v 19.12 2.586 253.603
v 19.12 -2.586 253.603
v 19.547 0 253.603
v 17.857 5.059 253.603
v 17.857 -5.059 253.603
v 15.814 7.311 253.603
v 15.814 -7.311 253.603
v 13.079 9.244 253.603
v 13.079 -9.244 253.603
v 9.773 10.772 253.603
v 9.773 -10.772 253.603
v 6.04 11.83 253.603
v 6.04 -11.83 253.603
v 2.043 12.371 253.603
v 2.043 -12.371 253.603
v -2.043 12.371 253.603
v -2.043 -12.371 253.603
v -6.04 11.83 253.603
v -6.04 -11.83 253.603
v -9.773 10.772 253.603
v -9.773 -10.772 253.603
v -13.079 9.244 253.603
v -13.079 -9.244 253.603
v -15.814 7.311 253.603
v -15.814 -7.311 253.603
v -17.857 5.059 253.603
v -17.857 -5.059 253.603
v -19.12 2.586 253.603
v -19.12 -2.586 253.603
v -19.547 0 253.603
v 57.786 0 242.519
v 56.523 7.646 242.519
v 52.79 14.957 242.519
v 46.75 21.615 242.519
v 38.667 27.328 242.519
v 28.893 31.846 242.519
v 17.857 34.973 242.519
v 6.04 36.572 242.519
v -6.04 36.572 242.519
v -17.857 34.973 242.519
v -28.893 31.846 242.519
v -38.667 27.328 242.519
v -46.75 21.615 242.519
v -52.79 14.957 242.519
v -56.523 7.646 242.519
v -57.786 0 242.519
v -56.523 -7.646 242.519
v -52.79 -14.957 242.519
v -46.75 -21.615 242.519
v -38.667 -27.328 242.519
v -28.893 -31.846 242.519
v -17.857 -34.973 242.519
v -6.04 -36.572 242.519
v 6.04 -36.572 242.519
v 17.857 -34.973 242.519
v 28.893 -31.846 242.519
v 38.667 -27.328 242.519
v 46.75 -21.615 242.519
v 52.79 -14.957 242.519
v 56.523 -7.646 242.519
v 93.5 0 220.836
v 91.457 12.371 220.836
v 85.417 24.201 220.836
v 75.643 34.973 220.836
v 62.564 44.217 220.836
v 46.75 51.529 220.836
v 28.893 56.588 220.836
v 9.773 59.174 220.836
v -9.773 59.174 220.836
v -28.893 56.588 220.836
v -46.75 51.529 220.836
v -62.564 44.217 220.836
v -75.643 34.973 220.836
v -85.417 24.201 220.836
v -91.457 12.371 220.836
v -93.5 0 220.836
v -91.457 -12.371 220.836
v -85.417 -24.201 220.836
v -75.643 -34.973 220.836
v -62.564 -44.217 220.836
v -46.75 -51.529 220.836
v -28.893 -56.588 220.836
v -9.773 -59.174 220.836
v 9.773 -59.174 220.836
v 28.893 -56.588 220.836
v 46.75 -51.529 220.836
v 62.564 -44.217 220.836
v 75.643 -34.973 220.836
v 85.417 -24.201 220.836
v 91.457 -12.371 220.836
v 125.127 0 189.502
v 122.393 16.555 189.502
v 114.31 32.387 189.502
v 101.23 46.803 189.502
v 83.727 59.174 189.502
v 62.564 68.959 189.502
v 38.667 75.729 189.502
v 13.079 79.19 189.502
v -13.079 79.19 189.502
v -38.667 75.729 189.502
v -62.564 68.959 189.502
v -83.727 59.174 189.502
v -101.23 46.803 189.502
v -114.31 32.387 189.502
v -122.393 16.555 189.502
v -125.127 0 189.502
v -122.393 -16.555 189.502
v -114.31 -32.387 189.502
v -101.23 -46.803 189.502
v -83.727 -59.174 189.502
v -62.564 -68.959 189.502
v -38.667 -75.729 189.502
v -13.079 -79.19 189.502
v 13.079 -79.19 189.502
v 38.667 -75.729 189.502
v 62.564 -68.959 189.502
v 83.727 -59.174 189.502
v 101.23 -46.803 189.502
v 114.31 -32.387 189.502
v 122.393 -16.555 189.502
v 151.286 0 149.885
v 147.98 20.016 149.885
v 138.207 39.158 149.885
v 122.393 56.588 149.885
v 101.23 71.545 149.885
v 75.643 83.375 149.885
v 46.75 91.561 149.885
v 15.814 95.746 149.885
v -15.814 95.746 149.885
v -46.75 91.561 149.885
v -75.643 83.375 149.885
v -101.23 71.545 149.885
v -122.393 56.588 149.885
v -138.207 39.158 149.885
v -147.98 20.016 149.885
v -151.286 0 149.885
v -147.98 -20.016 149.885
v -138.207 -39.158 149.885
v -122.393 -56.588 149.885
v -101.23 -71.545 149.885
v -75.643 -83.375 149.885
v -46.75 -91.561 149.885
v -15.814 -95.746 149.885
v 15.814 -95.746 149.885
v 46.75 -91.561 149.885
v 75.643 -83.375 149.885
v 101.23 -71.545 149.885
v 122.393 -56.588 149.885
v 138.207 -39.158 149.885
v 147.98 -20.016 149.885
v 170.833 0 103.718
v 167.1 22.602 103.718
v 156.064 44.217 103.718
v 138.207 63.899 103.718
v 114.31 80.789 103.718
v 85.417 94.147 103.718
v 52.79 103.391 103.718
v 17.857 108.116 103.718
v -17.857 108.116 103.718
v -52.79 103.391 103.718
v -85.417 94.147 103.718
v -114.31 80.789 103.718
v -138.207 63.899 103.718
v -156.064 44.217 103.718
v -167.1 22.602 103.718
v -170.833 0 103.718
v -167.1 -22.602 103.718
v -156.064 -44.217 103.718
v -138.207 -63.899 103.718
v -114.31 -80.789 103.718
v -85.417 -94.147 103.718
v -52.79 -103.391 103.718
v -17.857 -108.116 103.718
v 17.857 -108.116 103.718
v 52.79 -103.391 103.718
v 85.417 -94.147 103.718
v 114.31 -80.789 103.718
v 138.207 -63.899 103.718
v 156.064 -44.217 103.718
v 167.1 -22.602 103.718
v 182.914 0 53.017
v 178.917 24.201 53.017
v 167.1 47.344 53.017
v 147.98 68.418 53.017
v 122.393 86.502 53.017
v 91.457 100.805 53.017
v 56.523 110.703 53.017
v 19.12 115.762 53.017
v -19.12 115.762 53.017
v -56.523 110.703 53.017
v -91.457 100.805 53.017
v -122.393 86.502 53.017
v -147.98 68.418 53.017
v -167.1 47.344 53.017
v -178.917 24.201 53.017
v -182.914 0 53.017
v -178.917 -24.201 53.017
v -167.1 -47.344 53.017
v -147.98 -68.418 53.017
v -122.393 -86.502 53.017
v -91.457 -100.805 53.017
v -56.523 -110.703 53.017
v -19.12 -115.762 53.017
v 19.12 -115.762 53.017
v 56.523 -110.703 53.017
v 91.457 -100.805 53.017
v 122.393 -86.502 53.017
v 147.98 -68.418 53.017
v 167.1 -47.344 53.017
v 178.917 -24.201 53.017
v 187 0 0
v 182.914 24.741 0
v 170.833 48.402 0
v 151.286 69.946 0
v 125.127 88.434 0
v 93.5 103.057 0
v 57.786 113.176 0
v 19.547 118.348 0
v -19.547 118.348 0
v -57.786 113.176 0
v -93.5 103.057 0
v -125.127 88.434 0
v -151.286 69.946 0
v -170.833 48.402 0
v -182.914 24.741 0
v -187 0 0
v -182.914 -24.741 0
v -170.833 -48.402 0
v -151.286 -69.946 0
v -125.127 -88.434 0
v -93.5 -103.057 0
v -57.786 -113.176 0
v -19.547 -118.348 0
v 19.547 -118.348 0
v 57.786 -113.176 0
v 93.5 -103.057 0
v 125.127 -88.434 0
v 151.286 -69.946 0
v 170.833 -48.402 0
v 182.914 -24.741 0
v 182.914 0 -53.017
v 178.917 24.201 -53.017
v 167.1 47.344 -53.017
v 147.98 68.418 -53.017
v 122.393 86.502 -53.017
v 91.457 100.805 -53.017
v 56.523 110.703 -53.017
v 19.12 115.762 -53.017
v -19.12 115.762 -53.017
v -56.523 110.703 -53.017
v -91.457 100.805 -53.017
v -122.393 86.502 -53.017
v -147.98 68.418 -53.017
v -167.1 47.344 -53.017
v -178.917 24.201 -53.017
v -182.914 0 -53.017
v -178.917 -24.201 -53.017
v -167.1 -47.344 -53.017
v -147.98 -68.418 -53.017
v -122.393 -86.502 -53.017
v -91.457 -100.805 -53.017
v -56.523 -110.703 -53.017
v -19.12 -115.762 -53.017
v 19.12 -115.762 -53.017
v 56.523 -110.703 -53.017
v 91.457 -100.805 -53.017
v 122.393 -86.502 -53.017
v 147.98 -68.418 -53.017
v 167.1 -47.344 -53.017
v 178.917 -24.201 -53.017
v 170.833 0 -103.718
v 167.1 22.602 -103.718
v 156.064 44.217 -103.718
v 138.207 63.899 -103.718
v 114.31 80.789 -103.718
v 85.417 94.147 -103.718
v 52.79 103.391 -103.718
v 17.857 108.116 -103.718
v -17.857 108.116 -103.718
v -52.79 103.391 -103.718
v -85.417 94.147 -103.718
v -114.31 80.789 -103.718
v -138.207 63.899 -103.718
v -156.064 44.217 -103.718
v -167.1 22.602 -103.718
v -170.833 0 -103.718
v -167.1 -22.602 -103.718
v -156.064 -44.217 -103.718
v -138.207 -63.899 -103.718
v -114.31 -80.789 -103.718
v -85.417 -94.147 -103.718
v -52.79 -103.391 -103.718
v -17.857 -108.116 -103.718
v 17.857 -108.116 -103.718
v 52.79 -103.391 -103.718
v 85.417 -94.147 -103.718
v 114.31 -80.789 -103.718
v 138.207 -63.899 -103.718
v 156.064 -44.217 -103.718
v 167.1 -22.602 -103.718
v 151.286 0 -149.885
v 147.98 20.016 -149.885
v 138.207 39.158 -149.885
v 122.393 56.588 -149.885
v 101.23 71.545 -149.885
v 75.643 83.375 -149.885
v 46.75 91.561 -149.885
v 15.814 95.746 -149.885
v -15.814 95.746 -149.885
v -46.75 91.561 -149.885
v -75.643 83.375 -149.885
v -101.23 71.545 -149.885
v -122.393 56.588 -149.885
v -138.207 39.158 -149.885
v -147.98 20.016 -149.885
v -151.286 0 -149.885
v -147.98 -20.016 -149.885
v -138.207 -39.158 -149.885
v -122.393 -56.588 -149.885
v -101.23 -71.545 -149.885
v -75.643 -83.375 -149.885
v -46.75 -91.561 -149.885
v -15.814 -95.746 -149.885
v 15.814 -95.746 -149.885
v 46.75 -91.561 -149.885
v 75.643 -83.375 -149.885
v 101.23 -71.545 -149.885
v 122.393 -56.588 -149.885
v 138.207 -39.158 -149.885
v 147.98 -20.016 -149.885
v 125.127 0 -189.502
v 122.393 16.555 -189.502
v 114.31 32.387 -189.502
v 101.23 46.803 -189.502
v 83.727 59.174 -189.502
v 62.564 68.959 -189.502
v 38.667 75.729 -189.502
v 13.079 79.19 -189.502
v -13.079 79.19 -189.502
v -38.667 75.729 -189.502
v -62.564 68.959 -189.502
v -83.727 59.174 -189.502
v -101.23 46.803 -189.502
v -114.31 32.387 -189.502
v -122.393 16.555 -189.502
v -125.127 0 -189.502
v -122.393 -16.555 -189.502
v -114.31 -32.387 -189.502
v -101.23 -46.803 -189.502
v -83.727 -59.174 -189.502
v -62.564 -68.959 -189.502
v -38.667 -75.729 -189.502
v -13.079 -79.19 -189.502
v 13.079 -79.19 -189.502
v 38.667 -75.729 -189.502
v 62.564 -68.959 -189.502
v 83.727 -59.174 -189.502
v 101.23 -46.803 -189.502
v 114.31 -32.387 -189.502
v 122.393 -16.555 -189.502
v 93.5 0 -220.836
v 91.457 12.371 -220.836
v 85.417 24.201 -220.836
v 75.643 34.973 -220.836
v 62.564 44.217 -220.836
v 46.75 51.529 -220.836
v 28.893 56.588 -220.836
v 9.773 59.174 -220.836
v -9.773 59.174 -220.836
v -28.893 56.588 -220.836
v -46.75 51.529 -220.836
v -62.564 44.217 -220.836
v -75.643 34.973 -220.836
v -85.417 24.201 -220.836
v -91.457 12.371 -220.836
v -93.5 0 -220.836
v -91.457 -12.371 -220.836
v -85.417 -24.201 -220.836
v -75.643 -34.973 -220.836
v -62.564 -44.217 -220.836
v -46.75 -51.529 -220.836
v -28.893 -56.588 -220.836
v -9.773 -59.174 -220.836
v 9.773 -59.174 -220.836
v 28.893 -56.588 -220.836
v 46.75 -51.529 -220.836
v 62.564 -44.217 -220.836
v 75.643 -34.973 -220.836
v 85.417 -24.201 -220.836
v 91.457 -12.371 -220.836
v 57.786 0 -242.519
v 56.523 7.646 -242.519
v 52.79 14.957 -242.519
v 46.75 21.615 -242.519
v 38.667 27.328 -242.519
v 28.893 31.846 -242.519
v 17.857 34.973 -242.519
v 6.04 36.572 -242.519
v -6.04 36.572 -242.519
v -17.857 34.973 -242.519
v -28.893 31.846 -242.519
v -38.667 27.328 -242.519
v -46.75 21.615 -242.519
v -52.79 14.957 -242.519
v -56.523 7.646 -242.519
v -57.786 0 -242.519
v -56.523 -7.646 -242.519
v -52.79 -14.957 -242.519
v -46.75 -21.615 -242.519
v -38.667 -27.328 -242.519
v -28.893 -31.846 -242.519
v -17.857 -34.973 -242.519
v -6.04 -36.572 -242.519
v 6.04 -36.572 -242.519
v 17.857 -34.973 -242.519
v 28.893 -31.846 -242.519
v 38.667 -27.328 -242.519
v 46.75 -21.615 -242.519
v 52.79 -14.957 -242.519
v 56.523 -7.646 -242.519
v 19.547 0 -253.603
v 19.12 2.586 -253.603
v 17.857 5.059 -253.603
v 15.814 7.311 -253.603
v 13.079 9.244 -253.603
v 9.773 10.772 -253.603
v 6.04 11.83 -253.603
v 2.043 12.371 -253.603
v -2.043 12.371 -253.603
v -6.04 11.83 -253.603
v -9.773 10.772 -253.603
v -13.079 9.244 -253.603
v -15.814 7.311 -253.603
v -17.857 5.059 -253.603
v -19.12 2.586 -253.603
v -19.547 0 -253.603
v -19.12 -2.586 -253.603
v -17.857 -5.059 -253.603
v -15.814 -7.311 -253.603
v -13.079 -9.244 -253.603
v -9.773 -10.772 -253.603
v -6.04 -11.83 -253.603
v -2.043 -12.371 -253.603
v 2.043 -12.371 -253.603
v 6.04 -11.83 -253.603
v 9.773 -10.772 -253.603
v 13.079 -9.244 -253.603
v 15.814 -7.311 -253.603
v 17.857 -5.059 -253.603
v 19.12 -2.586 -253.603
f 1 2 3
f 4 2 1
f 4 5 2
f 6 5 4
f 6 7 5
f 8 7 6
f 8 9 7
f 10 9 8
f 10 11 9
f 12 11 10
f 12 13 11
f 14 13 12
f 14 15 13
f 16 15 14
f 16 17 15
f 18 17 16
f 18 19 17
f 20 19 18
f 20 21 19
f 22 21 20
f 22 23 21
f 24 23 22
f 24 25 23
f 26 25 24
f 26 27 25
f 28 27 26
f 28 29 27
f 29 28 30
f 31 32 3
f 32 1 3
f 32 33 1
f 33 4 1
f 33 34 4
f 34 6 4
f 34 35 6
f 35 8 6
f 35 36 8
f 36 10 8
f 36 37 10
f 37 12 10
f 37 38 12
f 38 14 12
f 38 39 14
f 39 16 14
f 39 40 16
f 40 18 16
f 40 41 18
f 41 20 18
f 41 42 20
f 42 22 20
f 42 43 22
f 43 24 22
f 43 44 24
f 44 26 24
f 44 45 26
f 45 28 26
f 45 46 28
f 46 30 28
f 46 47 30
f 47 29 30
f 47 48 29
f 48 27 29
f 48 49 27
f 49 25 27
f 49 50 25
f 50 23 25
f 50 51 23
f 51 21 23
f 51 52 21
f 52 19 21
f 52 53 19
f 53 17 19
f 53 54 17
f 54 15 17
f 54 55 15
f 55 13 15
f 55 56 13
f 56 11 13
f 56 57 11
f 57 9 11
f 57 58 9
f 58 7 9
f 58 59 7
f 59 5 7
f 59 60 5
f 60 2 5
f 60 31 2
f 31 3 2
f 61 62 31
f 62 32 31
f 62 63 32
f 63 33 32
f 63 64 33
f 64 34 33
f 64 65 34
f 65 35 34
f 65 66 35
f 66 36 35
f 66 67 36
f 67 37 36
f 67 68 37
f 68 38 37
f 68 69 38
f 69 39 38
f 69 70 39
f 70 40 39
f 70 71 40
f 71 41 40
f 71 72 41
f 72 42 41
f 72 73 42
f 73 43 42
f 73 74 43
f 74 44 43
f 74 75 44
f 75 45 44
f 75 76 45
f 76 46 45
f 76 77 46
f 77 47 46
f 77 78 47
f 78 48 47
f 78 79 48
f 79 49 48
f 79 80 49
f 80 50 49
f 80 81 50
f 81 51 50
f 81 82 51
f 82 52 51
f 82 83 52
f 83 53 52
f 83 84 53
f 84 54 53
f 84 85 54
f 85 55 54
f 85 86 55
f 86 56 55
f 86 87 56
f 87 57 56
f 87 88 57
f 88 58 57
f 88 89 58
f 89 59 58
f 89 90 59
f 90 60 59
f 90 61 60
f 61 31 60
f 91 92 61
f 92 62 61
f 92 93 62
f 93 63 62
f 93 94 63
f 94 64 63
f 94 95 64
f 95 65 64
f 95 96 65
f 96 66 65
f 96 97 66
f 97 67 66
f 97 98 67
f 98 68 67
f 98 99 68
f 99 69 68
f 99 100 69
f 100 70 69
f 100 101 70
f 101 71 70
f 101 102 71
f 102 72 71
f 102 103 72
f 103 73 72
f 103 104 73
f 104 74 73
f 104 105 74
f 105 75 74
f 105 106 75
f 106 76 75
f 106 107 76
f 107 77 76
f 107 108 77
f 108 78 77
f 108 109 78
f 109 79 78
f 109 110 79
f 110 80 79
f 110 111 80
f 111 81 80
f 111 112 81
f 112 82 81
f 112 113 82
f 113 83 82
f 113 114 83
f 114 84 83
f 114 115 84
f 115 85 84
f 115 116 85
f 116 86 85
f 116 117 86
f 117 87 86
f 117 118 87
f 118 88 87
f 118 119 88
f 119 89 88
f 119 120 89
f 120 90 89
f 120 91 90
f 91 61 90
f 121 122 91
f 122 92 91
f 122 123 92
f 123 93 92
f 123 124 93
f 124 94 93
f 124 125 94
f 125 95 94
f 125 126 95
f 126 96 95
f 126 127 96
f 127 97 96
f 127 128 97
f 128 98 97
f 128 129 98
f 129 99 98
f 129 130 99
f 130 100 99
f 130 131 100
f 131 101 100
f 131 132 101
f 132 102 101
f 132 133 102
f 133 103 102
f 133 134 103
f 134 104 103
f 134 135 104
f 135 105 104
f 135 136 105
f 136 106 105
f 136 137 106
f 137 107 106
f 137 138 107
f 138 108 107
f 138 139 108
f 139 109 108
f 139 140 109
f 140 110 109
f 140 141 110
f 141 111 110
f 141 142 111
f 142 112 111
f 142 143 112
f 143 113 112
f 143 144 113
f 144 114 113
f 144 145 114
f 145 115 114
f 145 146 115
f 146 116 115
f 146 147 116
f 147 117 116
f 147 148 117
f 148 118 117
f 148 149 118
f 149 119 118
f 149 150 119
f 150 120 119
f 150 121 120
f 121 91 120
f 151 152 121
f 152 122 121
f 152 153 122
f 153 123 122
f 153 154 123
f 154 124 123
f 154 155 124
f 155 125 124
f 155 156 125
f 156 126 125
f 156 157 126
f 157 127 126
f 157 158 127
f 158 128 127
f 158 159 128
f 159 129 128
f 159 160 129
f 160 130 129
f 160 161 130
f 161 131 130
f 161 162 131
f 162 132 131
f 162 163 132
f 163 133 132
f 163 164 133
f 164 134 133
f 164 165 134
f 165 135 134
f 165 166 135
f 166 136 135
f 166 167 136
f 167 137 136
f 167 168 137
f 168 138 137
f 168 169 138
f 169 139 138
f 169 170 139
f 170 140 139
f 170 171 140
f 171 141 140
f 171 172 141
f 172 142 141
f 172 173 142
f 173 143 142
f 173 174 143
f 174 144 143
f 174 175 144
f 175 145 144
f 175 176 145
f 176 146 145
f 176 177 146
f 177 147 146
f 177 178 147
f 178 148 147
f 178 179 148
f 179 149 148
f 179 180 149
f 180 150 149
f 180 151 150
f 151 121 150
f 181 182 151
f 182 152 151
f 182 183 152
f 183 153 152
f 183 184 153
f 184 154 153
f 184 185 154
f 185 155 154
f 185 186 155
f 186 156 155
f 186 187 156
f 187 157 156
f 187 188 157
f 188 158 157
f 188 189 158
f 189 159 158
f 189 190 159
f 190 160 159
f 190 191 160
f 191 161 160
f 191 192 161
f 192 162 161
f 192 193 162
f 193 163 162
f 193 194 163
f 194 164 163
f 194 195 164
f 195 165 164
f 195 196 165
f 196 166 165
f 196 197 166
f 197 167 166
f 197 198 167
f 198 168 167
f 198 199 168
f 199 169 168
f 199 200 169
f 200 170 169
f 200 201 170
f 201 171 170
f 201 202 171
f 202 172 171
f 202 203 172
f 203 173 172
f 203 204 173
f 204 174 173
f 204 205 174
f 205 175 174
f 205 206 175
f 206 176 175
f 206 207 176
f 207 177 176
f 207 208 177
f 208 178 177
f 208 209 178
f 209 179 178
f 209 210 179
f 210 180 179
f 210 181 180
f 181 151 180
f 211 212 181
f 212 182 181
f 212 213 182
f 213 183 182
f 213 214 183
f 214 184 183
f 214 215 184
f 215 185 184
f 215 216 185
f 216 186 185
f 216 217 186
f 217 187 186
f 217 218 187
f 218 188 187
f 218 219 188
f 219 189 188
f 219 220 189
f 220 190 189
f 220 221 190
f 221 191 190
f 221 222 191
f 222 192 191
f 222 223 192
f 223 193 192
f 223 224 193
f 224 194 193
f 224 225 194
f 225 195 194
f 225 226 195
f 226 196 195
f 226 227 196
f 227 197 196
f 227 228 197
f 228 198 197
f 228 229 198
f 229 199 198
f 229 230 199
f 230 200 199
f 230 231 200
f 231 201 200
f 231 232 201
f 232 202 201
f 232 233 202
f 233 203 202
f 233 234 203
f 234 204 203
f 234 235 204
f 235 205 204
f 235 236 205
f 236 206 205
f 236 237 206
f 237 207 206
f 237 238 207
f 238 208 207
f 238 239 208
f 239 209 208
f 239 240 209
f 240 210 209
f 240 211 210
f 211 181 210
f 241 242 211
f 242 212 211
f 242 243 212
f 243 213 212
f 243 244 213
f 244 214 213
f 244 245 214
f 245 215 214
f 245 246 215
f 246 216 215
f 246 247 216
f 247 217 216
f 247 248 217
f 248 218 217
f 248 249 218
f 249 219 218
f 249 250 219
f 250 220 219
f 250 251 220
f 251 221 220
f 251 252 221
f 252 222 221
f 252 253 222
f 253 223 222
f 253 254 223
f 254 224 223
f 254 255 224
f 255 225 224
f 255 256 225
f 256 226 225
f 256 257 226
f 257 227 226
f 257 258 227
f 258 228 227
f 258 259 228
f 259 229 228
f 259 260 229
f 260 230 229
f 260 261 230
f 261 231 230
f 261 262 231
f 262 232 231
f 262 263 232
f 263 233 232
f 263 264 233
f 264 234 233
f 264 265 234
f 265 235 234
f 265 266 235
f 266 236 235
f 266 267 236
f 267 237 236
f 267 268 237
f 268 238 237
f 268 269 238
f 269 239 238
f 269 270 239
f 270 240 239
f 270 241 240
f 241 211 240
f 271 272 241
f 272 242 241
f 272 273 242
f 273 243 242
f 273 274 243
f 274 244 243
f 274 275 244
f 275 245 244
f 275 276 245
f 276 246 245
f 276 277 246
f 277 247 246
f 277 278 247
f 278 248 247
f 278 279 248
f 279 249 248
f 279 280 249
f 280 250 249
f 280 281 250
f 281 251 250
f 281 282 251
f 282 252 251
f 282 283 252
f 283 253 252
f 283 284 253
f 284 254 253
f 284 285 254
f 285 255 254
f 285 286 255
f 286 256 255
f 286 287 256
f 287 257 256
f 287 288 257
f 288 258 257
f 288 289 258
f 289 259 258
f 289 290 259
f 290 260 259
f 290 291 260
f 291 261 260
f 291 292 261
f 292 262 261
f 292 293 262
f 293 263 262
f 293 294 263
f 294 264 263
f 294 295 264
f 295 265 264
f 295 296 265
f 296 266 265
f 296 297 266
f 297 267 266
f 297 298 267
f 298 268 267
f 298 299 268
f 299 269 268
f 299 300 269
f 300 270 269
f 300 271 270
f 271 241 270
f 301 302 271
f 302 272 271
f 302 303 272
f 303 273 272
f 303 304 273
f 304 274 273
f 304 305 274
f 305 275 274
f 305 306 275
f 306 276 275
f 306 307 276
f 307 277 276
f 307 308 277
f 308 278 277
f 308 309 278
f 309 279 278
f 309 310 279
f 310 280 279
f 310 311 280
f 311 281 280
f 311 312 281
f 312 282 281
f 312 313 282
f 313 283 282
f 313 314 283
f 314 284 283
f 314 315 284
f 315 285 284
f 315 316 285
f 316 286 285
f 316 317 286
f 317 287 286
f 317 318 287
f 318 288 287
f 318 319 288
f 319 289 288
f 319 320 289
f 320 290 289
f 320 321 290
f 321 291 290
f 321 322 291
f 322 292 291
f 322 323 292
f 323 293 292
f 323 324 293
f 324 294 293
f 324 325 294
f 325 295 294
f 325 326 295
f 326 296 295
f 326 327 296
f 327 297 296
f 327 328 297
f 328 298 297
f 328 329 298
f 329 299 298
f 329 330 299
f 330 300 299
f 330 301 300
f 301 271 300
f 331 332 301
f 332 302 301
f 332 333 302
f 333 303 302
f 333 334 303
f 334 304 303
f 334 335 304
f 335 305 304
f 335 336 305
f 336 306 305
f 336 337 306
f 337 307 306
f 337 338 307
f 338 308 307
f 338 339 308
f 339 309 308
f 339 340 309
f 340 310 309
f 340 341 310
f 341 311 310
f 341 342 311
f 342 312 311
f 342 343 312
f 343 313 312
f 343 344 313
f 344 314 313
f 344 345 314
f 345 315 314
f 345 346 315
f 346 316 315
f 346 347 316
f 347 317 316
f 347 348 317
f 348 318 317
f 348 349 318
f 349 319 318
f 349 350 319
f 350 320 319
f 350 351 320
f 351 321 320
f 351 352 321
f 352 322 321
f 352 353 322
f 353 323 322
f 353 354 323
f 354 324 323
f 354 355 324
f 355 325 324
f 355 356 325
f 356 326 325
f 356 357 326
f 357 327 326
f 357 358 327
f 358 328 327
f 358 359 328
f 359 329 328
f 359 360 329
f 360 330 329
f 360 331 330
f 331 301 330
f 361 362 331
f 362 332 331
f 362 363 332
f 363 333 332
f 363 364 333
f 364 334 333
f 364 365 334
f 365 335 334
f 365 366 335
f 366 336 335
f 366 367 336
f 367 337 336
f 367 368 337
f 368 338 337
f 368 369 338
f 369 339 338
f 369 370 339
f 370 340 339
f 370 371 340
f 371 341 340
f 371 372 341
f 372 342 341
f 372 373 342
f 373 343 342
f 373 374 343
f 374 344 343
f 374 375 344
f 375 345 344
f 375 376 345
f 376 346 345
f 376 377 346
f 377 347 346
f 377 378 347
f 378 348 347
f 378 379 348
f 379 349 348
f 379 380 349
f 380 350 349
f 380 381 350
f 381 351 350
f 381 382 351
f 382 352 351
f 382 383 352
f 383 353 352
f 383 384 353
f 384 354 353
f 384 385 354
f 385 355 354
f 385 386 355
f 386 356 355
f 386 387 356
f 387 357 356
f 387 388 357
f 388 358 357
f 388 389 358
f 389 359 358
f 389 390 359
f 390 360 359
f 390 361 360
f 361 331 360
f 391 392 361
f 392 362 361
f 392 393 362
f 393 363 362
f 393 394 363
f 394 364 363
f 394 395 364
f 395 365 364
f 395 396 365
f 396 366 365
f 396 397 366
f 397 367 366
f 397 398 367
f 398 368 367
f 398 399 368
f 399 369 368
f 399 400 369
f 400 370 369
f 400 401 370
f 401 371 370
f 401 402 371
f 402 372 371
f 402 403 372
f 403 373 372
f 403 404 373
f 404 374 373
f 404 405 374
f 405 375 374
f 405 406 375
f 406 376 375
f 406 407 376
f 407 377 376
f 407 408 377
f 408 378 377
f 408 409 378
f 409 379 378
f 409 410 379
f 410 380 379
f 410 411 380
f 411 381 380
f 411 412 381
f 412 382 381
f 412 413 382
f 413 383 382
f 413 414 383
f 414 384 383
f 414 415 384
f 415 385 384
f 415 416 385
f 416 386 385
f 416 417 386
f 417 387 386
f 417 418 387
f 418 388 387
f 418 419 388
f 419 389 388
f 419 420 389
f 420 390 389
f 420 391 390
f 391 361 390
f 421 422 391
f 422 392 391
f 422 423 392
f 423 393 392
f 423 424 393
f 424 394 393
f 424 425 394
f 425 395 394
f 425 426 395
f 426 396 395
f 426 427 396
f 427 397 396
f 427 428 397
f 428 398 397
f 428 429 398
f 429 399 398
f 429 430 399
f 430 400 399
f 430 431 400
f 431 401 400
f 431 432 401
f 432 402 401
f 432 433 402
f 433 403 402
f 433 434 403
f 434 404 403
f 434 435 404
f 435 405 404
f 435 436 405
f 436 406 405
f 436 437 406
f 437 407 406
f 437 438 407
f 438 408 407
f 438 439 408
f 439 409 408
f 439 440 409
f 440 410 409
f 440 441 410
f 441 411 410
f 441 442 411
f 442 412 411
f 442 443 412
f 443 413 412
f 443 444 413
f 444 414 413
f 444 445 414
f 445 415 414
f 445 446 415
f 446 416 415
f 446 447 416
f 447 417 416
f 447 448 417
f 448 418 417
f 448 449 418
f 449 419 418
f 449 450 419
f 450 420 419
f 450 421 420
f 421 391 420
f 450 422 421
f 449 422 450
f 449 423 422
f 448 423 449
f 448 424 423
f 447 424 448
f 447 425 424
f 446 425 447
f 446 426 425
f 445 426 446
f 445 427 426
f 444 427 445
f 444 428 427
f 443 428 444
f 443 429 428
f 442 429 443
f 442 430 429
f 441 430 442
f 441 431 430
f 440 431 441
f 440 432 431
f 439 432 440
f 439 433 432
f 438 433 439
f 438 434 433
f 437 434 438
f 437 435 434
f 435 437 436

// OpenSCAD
// Generated by SolidPython 1.0.1 on 2020-07-29 00:46:49


scale(v = [11, 7, 15]) {
	sphere(r = 17);
}
/***********************************************
*********      SolidPython code:      **********
************************************************
 
# import packages: SolidPython
from solid import *
from solid.utils import *
from itertools import chain, combinations, permutations


class Resize:

    def __init__(self, scad_file):
        self.scad_file = scad_file
        #self.scad_file = import_scad(scad_file)
        # cone/cylinder param:
        self.r1 = 0
        self.r2 = 0
        self.h = 0
        # rectangular prism param:
        self.w = 0
        self.l = 0
        # ellipse param:
        self.r = 0

    # import OpenScad code (file name corresponds to shape)


    # classify shape + parameters
    def assign(self, param1, param2, param3):
        if self.scad_file == 'cone.scad':
            self.r1 = param1
            self.r2 = param2
            self.h = param3
        elif self.scad_file == 'cylinder.scad':
            self.r1 = param1
            self.r2 = param2
            self.h = param3
        elif self.scad_file == 'rectangularPrism.scad':
            self.h = param1
            self.l = param2
            self.w = param3
        else:
            self.r = param1
            self.h = param2

    # resize parameters
    def iterate(self):
        x = range(3, 20, 2)
        i = 1
        if self.scad_file == 'cone.scad':
            tempList = list(permutations(x, 2))
            for temp in tempList:
                param1 = temp[0]
                param2 = temp[1]
                filepath = 'produced_scad_files/' + 'cone' + str(param1) + '_' + str(param2) + '_' + '.scad'
                scad_render_to_file(cylinder(h=param1, r1=param2, r2=0), filepath)

        elif self.scad_file == 'cylinder.scad':
            tempList = list(permutations(x, 3))
            for temp in tempList:
                param1 = temp[0]
                param2 = temp[1]
                filepath = 'produced_scad_files/' + 'cylinder' + str(param1) + '_' + str(param2) + '_' + '.scad'
                scad_render_to_file(cylinder(h=param1, r1=param2, r2=param2), filepath)

        elif self.scad_file == 'rectangularPrism.scad':
            tempList = list(permutations(x, 3))
            for temp in tempList:
                param1 = temp[0]
                param2 = temp[1]
                param3 = temp[2]
                filepath = 'produced_scad_files/' + 'rectangularPrism' + str(param1) + '_' + str(param2) + '_' + str(
                    param3) + '.scad'
                scad_render_to_file(cube(size=(param1, param2, param3)), filepath)

        elif self.scad_file == 'ellipse.scad':
            tempList = list(permutations(x, 4))
            for temp in tempList:
                param1 = temp[0]
                param2 = temp[1]
                param3 = temp[2]
                param4 = temp[3]
                filepath = 'produced_scad_files/' + 'ellipse' + str(param1) + '_' + str(param2) + '_' + str(param3) + '_' + str(param4) + '.scad'
                scad_render_to_file(scale([param1, param2, param3])(sphere(r=param4)), filepath)

    def render_to_scadfile(self):
        scad_render_to_file(scad, 'example.scad') 
 
************************************************/
